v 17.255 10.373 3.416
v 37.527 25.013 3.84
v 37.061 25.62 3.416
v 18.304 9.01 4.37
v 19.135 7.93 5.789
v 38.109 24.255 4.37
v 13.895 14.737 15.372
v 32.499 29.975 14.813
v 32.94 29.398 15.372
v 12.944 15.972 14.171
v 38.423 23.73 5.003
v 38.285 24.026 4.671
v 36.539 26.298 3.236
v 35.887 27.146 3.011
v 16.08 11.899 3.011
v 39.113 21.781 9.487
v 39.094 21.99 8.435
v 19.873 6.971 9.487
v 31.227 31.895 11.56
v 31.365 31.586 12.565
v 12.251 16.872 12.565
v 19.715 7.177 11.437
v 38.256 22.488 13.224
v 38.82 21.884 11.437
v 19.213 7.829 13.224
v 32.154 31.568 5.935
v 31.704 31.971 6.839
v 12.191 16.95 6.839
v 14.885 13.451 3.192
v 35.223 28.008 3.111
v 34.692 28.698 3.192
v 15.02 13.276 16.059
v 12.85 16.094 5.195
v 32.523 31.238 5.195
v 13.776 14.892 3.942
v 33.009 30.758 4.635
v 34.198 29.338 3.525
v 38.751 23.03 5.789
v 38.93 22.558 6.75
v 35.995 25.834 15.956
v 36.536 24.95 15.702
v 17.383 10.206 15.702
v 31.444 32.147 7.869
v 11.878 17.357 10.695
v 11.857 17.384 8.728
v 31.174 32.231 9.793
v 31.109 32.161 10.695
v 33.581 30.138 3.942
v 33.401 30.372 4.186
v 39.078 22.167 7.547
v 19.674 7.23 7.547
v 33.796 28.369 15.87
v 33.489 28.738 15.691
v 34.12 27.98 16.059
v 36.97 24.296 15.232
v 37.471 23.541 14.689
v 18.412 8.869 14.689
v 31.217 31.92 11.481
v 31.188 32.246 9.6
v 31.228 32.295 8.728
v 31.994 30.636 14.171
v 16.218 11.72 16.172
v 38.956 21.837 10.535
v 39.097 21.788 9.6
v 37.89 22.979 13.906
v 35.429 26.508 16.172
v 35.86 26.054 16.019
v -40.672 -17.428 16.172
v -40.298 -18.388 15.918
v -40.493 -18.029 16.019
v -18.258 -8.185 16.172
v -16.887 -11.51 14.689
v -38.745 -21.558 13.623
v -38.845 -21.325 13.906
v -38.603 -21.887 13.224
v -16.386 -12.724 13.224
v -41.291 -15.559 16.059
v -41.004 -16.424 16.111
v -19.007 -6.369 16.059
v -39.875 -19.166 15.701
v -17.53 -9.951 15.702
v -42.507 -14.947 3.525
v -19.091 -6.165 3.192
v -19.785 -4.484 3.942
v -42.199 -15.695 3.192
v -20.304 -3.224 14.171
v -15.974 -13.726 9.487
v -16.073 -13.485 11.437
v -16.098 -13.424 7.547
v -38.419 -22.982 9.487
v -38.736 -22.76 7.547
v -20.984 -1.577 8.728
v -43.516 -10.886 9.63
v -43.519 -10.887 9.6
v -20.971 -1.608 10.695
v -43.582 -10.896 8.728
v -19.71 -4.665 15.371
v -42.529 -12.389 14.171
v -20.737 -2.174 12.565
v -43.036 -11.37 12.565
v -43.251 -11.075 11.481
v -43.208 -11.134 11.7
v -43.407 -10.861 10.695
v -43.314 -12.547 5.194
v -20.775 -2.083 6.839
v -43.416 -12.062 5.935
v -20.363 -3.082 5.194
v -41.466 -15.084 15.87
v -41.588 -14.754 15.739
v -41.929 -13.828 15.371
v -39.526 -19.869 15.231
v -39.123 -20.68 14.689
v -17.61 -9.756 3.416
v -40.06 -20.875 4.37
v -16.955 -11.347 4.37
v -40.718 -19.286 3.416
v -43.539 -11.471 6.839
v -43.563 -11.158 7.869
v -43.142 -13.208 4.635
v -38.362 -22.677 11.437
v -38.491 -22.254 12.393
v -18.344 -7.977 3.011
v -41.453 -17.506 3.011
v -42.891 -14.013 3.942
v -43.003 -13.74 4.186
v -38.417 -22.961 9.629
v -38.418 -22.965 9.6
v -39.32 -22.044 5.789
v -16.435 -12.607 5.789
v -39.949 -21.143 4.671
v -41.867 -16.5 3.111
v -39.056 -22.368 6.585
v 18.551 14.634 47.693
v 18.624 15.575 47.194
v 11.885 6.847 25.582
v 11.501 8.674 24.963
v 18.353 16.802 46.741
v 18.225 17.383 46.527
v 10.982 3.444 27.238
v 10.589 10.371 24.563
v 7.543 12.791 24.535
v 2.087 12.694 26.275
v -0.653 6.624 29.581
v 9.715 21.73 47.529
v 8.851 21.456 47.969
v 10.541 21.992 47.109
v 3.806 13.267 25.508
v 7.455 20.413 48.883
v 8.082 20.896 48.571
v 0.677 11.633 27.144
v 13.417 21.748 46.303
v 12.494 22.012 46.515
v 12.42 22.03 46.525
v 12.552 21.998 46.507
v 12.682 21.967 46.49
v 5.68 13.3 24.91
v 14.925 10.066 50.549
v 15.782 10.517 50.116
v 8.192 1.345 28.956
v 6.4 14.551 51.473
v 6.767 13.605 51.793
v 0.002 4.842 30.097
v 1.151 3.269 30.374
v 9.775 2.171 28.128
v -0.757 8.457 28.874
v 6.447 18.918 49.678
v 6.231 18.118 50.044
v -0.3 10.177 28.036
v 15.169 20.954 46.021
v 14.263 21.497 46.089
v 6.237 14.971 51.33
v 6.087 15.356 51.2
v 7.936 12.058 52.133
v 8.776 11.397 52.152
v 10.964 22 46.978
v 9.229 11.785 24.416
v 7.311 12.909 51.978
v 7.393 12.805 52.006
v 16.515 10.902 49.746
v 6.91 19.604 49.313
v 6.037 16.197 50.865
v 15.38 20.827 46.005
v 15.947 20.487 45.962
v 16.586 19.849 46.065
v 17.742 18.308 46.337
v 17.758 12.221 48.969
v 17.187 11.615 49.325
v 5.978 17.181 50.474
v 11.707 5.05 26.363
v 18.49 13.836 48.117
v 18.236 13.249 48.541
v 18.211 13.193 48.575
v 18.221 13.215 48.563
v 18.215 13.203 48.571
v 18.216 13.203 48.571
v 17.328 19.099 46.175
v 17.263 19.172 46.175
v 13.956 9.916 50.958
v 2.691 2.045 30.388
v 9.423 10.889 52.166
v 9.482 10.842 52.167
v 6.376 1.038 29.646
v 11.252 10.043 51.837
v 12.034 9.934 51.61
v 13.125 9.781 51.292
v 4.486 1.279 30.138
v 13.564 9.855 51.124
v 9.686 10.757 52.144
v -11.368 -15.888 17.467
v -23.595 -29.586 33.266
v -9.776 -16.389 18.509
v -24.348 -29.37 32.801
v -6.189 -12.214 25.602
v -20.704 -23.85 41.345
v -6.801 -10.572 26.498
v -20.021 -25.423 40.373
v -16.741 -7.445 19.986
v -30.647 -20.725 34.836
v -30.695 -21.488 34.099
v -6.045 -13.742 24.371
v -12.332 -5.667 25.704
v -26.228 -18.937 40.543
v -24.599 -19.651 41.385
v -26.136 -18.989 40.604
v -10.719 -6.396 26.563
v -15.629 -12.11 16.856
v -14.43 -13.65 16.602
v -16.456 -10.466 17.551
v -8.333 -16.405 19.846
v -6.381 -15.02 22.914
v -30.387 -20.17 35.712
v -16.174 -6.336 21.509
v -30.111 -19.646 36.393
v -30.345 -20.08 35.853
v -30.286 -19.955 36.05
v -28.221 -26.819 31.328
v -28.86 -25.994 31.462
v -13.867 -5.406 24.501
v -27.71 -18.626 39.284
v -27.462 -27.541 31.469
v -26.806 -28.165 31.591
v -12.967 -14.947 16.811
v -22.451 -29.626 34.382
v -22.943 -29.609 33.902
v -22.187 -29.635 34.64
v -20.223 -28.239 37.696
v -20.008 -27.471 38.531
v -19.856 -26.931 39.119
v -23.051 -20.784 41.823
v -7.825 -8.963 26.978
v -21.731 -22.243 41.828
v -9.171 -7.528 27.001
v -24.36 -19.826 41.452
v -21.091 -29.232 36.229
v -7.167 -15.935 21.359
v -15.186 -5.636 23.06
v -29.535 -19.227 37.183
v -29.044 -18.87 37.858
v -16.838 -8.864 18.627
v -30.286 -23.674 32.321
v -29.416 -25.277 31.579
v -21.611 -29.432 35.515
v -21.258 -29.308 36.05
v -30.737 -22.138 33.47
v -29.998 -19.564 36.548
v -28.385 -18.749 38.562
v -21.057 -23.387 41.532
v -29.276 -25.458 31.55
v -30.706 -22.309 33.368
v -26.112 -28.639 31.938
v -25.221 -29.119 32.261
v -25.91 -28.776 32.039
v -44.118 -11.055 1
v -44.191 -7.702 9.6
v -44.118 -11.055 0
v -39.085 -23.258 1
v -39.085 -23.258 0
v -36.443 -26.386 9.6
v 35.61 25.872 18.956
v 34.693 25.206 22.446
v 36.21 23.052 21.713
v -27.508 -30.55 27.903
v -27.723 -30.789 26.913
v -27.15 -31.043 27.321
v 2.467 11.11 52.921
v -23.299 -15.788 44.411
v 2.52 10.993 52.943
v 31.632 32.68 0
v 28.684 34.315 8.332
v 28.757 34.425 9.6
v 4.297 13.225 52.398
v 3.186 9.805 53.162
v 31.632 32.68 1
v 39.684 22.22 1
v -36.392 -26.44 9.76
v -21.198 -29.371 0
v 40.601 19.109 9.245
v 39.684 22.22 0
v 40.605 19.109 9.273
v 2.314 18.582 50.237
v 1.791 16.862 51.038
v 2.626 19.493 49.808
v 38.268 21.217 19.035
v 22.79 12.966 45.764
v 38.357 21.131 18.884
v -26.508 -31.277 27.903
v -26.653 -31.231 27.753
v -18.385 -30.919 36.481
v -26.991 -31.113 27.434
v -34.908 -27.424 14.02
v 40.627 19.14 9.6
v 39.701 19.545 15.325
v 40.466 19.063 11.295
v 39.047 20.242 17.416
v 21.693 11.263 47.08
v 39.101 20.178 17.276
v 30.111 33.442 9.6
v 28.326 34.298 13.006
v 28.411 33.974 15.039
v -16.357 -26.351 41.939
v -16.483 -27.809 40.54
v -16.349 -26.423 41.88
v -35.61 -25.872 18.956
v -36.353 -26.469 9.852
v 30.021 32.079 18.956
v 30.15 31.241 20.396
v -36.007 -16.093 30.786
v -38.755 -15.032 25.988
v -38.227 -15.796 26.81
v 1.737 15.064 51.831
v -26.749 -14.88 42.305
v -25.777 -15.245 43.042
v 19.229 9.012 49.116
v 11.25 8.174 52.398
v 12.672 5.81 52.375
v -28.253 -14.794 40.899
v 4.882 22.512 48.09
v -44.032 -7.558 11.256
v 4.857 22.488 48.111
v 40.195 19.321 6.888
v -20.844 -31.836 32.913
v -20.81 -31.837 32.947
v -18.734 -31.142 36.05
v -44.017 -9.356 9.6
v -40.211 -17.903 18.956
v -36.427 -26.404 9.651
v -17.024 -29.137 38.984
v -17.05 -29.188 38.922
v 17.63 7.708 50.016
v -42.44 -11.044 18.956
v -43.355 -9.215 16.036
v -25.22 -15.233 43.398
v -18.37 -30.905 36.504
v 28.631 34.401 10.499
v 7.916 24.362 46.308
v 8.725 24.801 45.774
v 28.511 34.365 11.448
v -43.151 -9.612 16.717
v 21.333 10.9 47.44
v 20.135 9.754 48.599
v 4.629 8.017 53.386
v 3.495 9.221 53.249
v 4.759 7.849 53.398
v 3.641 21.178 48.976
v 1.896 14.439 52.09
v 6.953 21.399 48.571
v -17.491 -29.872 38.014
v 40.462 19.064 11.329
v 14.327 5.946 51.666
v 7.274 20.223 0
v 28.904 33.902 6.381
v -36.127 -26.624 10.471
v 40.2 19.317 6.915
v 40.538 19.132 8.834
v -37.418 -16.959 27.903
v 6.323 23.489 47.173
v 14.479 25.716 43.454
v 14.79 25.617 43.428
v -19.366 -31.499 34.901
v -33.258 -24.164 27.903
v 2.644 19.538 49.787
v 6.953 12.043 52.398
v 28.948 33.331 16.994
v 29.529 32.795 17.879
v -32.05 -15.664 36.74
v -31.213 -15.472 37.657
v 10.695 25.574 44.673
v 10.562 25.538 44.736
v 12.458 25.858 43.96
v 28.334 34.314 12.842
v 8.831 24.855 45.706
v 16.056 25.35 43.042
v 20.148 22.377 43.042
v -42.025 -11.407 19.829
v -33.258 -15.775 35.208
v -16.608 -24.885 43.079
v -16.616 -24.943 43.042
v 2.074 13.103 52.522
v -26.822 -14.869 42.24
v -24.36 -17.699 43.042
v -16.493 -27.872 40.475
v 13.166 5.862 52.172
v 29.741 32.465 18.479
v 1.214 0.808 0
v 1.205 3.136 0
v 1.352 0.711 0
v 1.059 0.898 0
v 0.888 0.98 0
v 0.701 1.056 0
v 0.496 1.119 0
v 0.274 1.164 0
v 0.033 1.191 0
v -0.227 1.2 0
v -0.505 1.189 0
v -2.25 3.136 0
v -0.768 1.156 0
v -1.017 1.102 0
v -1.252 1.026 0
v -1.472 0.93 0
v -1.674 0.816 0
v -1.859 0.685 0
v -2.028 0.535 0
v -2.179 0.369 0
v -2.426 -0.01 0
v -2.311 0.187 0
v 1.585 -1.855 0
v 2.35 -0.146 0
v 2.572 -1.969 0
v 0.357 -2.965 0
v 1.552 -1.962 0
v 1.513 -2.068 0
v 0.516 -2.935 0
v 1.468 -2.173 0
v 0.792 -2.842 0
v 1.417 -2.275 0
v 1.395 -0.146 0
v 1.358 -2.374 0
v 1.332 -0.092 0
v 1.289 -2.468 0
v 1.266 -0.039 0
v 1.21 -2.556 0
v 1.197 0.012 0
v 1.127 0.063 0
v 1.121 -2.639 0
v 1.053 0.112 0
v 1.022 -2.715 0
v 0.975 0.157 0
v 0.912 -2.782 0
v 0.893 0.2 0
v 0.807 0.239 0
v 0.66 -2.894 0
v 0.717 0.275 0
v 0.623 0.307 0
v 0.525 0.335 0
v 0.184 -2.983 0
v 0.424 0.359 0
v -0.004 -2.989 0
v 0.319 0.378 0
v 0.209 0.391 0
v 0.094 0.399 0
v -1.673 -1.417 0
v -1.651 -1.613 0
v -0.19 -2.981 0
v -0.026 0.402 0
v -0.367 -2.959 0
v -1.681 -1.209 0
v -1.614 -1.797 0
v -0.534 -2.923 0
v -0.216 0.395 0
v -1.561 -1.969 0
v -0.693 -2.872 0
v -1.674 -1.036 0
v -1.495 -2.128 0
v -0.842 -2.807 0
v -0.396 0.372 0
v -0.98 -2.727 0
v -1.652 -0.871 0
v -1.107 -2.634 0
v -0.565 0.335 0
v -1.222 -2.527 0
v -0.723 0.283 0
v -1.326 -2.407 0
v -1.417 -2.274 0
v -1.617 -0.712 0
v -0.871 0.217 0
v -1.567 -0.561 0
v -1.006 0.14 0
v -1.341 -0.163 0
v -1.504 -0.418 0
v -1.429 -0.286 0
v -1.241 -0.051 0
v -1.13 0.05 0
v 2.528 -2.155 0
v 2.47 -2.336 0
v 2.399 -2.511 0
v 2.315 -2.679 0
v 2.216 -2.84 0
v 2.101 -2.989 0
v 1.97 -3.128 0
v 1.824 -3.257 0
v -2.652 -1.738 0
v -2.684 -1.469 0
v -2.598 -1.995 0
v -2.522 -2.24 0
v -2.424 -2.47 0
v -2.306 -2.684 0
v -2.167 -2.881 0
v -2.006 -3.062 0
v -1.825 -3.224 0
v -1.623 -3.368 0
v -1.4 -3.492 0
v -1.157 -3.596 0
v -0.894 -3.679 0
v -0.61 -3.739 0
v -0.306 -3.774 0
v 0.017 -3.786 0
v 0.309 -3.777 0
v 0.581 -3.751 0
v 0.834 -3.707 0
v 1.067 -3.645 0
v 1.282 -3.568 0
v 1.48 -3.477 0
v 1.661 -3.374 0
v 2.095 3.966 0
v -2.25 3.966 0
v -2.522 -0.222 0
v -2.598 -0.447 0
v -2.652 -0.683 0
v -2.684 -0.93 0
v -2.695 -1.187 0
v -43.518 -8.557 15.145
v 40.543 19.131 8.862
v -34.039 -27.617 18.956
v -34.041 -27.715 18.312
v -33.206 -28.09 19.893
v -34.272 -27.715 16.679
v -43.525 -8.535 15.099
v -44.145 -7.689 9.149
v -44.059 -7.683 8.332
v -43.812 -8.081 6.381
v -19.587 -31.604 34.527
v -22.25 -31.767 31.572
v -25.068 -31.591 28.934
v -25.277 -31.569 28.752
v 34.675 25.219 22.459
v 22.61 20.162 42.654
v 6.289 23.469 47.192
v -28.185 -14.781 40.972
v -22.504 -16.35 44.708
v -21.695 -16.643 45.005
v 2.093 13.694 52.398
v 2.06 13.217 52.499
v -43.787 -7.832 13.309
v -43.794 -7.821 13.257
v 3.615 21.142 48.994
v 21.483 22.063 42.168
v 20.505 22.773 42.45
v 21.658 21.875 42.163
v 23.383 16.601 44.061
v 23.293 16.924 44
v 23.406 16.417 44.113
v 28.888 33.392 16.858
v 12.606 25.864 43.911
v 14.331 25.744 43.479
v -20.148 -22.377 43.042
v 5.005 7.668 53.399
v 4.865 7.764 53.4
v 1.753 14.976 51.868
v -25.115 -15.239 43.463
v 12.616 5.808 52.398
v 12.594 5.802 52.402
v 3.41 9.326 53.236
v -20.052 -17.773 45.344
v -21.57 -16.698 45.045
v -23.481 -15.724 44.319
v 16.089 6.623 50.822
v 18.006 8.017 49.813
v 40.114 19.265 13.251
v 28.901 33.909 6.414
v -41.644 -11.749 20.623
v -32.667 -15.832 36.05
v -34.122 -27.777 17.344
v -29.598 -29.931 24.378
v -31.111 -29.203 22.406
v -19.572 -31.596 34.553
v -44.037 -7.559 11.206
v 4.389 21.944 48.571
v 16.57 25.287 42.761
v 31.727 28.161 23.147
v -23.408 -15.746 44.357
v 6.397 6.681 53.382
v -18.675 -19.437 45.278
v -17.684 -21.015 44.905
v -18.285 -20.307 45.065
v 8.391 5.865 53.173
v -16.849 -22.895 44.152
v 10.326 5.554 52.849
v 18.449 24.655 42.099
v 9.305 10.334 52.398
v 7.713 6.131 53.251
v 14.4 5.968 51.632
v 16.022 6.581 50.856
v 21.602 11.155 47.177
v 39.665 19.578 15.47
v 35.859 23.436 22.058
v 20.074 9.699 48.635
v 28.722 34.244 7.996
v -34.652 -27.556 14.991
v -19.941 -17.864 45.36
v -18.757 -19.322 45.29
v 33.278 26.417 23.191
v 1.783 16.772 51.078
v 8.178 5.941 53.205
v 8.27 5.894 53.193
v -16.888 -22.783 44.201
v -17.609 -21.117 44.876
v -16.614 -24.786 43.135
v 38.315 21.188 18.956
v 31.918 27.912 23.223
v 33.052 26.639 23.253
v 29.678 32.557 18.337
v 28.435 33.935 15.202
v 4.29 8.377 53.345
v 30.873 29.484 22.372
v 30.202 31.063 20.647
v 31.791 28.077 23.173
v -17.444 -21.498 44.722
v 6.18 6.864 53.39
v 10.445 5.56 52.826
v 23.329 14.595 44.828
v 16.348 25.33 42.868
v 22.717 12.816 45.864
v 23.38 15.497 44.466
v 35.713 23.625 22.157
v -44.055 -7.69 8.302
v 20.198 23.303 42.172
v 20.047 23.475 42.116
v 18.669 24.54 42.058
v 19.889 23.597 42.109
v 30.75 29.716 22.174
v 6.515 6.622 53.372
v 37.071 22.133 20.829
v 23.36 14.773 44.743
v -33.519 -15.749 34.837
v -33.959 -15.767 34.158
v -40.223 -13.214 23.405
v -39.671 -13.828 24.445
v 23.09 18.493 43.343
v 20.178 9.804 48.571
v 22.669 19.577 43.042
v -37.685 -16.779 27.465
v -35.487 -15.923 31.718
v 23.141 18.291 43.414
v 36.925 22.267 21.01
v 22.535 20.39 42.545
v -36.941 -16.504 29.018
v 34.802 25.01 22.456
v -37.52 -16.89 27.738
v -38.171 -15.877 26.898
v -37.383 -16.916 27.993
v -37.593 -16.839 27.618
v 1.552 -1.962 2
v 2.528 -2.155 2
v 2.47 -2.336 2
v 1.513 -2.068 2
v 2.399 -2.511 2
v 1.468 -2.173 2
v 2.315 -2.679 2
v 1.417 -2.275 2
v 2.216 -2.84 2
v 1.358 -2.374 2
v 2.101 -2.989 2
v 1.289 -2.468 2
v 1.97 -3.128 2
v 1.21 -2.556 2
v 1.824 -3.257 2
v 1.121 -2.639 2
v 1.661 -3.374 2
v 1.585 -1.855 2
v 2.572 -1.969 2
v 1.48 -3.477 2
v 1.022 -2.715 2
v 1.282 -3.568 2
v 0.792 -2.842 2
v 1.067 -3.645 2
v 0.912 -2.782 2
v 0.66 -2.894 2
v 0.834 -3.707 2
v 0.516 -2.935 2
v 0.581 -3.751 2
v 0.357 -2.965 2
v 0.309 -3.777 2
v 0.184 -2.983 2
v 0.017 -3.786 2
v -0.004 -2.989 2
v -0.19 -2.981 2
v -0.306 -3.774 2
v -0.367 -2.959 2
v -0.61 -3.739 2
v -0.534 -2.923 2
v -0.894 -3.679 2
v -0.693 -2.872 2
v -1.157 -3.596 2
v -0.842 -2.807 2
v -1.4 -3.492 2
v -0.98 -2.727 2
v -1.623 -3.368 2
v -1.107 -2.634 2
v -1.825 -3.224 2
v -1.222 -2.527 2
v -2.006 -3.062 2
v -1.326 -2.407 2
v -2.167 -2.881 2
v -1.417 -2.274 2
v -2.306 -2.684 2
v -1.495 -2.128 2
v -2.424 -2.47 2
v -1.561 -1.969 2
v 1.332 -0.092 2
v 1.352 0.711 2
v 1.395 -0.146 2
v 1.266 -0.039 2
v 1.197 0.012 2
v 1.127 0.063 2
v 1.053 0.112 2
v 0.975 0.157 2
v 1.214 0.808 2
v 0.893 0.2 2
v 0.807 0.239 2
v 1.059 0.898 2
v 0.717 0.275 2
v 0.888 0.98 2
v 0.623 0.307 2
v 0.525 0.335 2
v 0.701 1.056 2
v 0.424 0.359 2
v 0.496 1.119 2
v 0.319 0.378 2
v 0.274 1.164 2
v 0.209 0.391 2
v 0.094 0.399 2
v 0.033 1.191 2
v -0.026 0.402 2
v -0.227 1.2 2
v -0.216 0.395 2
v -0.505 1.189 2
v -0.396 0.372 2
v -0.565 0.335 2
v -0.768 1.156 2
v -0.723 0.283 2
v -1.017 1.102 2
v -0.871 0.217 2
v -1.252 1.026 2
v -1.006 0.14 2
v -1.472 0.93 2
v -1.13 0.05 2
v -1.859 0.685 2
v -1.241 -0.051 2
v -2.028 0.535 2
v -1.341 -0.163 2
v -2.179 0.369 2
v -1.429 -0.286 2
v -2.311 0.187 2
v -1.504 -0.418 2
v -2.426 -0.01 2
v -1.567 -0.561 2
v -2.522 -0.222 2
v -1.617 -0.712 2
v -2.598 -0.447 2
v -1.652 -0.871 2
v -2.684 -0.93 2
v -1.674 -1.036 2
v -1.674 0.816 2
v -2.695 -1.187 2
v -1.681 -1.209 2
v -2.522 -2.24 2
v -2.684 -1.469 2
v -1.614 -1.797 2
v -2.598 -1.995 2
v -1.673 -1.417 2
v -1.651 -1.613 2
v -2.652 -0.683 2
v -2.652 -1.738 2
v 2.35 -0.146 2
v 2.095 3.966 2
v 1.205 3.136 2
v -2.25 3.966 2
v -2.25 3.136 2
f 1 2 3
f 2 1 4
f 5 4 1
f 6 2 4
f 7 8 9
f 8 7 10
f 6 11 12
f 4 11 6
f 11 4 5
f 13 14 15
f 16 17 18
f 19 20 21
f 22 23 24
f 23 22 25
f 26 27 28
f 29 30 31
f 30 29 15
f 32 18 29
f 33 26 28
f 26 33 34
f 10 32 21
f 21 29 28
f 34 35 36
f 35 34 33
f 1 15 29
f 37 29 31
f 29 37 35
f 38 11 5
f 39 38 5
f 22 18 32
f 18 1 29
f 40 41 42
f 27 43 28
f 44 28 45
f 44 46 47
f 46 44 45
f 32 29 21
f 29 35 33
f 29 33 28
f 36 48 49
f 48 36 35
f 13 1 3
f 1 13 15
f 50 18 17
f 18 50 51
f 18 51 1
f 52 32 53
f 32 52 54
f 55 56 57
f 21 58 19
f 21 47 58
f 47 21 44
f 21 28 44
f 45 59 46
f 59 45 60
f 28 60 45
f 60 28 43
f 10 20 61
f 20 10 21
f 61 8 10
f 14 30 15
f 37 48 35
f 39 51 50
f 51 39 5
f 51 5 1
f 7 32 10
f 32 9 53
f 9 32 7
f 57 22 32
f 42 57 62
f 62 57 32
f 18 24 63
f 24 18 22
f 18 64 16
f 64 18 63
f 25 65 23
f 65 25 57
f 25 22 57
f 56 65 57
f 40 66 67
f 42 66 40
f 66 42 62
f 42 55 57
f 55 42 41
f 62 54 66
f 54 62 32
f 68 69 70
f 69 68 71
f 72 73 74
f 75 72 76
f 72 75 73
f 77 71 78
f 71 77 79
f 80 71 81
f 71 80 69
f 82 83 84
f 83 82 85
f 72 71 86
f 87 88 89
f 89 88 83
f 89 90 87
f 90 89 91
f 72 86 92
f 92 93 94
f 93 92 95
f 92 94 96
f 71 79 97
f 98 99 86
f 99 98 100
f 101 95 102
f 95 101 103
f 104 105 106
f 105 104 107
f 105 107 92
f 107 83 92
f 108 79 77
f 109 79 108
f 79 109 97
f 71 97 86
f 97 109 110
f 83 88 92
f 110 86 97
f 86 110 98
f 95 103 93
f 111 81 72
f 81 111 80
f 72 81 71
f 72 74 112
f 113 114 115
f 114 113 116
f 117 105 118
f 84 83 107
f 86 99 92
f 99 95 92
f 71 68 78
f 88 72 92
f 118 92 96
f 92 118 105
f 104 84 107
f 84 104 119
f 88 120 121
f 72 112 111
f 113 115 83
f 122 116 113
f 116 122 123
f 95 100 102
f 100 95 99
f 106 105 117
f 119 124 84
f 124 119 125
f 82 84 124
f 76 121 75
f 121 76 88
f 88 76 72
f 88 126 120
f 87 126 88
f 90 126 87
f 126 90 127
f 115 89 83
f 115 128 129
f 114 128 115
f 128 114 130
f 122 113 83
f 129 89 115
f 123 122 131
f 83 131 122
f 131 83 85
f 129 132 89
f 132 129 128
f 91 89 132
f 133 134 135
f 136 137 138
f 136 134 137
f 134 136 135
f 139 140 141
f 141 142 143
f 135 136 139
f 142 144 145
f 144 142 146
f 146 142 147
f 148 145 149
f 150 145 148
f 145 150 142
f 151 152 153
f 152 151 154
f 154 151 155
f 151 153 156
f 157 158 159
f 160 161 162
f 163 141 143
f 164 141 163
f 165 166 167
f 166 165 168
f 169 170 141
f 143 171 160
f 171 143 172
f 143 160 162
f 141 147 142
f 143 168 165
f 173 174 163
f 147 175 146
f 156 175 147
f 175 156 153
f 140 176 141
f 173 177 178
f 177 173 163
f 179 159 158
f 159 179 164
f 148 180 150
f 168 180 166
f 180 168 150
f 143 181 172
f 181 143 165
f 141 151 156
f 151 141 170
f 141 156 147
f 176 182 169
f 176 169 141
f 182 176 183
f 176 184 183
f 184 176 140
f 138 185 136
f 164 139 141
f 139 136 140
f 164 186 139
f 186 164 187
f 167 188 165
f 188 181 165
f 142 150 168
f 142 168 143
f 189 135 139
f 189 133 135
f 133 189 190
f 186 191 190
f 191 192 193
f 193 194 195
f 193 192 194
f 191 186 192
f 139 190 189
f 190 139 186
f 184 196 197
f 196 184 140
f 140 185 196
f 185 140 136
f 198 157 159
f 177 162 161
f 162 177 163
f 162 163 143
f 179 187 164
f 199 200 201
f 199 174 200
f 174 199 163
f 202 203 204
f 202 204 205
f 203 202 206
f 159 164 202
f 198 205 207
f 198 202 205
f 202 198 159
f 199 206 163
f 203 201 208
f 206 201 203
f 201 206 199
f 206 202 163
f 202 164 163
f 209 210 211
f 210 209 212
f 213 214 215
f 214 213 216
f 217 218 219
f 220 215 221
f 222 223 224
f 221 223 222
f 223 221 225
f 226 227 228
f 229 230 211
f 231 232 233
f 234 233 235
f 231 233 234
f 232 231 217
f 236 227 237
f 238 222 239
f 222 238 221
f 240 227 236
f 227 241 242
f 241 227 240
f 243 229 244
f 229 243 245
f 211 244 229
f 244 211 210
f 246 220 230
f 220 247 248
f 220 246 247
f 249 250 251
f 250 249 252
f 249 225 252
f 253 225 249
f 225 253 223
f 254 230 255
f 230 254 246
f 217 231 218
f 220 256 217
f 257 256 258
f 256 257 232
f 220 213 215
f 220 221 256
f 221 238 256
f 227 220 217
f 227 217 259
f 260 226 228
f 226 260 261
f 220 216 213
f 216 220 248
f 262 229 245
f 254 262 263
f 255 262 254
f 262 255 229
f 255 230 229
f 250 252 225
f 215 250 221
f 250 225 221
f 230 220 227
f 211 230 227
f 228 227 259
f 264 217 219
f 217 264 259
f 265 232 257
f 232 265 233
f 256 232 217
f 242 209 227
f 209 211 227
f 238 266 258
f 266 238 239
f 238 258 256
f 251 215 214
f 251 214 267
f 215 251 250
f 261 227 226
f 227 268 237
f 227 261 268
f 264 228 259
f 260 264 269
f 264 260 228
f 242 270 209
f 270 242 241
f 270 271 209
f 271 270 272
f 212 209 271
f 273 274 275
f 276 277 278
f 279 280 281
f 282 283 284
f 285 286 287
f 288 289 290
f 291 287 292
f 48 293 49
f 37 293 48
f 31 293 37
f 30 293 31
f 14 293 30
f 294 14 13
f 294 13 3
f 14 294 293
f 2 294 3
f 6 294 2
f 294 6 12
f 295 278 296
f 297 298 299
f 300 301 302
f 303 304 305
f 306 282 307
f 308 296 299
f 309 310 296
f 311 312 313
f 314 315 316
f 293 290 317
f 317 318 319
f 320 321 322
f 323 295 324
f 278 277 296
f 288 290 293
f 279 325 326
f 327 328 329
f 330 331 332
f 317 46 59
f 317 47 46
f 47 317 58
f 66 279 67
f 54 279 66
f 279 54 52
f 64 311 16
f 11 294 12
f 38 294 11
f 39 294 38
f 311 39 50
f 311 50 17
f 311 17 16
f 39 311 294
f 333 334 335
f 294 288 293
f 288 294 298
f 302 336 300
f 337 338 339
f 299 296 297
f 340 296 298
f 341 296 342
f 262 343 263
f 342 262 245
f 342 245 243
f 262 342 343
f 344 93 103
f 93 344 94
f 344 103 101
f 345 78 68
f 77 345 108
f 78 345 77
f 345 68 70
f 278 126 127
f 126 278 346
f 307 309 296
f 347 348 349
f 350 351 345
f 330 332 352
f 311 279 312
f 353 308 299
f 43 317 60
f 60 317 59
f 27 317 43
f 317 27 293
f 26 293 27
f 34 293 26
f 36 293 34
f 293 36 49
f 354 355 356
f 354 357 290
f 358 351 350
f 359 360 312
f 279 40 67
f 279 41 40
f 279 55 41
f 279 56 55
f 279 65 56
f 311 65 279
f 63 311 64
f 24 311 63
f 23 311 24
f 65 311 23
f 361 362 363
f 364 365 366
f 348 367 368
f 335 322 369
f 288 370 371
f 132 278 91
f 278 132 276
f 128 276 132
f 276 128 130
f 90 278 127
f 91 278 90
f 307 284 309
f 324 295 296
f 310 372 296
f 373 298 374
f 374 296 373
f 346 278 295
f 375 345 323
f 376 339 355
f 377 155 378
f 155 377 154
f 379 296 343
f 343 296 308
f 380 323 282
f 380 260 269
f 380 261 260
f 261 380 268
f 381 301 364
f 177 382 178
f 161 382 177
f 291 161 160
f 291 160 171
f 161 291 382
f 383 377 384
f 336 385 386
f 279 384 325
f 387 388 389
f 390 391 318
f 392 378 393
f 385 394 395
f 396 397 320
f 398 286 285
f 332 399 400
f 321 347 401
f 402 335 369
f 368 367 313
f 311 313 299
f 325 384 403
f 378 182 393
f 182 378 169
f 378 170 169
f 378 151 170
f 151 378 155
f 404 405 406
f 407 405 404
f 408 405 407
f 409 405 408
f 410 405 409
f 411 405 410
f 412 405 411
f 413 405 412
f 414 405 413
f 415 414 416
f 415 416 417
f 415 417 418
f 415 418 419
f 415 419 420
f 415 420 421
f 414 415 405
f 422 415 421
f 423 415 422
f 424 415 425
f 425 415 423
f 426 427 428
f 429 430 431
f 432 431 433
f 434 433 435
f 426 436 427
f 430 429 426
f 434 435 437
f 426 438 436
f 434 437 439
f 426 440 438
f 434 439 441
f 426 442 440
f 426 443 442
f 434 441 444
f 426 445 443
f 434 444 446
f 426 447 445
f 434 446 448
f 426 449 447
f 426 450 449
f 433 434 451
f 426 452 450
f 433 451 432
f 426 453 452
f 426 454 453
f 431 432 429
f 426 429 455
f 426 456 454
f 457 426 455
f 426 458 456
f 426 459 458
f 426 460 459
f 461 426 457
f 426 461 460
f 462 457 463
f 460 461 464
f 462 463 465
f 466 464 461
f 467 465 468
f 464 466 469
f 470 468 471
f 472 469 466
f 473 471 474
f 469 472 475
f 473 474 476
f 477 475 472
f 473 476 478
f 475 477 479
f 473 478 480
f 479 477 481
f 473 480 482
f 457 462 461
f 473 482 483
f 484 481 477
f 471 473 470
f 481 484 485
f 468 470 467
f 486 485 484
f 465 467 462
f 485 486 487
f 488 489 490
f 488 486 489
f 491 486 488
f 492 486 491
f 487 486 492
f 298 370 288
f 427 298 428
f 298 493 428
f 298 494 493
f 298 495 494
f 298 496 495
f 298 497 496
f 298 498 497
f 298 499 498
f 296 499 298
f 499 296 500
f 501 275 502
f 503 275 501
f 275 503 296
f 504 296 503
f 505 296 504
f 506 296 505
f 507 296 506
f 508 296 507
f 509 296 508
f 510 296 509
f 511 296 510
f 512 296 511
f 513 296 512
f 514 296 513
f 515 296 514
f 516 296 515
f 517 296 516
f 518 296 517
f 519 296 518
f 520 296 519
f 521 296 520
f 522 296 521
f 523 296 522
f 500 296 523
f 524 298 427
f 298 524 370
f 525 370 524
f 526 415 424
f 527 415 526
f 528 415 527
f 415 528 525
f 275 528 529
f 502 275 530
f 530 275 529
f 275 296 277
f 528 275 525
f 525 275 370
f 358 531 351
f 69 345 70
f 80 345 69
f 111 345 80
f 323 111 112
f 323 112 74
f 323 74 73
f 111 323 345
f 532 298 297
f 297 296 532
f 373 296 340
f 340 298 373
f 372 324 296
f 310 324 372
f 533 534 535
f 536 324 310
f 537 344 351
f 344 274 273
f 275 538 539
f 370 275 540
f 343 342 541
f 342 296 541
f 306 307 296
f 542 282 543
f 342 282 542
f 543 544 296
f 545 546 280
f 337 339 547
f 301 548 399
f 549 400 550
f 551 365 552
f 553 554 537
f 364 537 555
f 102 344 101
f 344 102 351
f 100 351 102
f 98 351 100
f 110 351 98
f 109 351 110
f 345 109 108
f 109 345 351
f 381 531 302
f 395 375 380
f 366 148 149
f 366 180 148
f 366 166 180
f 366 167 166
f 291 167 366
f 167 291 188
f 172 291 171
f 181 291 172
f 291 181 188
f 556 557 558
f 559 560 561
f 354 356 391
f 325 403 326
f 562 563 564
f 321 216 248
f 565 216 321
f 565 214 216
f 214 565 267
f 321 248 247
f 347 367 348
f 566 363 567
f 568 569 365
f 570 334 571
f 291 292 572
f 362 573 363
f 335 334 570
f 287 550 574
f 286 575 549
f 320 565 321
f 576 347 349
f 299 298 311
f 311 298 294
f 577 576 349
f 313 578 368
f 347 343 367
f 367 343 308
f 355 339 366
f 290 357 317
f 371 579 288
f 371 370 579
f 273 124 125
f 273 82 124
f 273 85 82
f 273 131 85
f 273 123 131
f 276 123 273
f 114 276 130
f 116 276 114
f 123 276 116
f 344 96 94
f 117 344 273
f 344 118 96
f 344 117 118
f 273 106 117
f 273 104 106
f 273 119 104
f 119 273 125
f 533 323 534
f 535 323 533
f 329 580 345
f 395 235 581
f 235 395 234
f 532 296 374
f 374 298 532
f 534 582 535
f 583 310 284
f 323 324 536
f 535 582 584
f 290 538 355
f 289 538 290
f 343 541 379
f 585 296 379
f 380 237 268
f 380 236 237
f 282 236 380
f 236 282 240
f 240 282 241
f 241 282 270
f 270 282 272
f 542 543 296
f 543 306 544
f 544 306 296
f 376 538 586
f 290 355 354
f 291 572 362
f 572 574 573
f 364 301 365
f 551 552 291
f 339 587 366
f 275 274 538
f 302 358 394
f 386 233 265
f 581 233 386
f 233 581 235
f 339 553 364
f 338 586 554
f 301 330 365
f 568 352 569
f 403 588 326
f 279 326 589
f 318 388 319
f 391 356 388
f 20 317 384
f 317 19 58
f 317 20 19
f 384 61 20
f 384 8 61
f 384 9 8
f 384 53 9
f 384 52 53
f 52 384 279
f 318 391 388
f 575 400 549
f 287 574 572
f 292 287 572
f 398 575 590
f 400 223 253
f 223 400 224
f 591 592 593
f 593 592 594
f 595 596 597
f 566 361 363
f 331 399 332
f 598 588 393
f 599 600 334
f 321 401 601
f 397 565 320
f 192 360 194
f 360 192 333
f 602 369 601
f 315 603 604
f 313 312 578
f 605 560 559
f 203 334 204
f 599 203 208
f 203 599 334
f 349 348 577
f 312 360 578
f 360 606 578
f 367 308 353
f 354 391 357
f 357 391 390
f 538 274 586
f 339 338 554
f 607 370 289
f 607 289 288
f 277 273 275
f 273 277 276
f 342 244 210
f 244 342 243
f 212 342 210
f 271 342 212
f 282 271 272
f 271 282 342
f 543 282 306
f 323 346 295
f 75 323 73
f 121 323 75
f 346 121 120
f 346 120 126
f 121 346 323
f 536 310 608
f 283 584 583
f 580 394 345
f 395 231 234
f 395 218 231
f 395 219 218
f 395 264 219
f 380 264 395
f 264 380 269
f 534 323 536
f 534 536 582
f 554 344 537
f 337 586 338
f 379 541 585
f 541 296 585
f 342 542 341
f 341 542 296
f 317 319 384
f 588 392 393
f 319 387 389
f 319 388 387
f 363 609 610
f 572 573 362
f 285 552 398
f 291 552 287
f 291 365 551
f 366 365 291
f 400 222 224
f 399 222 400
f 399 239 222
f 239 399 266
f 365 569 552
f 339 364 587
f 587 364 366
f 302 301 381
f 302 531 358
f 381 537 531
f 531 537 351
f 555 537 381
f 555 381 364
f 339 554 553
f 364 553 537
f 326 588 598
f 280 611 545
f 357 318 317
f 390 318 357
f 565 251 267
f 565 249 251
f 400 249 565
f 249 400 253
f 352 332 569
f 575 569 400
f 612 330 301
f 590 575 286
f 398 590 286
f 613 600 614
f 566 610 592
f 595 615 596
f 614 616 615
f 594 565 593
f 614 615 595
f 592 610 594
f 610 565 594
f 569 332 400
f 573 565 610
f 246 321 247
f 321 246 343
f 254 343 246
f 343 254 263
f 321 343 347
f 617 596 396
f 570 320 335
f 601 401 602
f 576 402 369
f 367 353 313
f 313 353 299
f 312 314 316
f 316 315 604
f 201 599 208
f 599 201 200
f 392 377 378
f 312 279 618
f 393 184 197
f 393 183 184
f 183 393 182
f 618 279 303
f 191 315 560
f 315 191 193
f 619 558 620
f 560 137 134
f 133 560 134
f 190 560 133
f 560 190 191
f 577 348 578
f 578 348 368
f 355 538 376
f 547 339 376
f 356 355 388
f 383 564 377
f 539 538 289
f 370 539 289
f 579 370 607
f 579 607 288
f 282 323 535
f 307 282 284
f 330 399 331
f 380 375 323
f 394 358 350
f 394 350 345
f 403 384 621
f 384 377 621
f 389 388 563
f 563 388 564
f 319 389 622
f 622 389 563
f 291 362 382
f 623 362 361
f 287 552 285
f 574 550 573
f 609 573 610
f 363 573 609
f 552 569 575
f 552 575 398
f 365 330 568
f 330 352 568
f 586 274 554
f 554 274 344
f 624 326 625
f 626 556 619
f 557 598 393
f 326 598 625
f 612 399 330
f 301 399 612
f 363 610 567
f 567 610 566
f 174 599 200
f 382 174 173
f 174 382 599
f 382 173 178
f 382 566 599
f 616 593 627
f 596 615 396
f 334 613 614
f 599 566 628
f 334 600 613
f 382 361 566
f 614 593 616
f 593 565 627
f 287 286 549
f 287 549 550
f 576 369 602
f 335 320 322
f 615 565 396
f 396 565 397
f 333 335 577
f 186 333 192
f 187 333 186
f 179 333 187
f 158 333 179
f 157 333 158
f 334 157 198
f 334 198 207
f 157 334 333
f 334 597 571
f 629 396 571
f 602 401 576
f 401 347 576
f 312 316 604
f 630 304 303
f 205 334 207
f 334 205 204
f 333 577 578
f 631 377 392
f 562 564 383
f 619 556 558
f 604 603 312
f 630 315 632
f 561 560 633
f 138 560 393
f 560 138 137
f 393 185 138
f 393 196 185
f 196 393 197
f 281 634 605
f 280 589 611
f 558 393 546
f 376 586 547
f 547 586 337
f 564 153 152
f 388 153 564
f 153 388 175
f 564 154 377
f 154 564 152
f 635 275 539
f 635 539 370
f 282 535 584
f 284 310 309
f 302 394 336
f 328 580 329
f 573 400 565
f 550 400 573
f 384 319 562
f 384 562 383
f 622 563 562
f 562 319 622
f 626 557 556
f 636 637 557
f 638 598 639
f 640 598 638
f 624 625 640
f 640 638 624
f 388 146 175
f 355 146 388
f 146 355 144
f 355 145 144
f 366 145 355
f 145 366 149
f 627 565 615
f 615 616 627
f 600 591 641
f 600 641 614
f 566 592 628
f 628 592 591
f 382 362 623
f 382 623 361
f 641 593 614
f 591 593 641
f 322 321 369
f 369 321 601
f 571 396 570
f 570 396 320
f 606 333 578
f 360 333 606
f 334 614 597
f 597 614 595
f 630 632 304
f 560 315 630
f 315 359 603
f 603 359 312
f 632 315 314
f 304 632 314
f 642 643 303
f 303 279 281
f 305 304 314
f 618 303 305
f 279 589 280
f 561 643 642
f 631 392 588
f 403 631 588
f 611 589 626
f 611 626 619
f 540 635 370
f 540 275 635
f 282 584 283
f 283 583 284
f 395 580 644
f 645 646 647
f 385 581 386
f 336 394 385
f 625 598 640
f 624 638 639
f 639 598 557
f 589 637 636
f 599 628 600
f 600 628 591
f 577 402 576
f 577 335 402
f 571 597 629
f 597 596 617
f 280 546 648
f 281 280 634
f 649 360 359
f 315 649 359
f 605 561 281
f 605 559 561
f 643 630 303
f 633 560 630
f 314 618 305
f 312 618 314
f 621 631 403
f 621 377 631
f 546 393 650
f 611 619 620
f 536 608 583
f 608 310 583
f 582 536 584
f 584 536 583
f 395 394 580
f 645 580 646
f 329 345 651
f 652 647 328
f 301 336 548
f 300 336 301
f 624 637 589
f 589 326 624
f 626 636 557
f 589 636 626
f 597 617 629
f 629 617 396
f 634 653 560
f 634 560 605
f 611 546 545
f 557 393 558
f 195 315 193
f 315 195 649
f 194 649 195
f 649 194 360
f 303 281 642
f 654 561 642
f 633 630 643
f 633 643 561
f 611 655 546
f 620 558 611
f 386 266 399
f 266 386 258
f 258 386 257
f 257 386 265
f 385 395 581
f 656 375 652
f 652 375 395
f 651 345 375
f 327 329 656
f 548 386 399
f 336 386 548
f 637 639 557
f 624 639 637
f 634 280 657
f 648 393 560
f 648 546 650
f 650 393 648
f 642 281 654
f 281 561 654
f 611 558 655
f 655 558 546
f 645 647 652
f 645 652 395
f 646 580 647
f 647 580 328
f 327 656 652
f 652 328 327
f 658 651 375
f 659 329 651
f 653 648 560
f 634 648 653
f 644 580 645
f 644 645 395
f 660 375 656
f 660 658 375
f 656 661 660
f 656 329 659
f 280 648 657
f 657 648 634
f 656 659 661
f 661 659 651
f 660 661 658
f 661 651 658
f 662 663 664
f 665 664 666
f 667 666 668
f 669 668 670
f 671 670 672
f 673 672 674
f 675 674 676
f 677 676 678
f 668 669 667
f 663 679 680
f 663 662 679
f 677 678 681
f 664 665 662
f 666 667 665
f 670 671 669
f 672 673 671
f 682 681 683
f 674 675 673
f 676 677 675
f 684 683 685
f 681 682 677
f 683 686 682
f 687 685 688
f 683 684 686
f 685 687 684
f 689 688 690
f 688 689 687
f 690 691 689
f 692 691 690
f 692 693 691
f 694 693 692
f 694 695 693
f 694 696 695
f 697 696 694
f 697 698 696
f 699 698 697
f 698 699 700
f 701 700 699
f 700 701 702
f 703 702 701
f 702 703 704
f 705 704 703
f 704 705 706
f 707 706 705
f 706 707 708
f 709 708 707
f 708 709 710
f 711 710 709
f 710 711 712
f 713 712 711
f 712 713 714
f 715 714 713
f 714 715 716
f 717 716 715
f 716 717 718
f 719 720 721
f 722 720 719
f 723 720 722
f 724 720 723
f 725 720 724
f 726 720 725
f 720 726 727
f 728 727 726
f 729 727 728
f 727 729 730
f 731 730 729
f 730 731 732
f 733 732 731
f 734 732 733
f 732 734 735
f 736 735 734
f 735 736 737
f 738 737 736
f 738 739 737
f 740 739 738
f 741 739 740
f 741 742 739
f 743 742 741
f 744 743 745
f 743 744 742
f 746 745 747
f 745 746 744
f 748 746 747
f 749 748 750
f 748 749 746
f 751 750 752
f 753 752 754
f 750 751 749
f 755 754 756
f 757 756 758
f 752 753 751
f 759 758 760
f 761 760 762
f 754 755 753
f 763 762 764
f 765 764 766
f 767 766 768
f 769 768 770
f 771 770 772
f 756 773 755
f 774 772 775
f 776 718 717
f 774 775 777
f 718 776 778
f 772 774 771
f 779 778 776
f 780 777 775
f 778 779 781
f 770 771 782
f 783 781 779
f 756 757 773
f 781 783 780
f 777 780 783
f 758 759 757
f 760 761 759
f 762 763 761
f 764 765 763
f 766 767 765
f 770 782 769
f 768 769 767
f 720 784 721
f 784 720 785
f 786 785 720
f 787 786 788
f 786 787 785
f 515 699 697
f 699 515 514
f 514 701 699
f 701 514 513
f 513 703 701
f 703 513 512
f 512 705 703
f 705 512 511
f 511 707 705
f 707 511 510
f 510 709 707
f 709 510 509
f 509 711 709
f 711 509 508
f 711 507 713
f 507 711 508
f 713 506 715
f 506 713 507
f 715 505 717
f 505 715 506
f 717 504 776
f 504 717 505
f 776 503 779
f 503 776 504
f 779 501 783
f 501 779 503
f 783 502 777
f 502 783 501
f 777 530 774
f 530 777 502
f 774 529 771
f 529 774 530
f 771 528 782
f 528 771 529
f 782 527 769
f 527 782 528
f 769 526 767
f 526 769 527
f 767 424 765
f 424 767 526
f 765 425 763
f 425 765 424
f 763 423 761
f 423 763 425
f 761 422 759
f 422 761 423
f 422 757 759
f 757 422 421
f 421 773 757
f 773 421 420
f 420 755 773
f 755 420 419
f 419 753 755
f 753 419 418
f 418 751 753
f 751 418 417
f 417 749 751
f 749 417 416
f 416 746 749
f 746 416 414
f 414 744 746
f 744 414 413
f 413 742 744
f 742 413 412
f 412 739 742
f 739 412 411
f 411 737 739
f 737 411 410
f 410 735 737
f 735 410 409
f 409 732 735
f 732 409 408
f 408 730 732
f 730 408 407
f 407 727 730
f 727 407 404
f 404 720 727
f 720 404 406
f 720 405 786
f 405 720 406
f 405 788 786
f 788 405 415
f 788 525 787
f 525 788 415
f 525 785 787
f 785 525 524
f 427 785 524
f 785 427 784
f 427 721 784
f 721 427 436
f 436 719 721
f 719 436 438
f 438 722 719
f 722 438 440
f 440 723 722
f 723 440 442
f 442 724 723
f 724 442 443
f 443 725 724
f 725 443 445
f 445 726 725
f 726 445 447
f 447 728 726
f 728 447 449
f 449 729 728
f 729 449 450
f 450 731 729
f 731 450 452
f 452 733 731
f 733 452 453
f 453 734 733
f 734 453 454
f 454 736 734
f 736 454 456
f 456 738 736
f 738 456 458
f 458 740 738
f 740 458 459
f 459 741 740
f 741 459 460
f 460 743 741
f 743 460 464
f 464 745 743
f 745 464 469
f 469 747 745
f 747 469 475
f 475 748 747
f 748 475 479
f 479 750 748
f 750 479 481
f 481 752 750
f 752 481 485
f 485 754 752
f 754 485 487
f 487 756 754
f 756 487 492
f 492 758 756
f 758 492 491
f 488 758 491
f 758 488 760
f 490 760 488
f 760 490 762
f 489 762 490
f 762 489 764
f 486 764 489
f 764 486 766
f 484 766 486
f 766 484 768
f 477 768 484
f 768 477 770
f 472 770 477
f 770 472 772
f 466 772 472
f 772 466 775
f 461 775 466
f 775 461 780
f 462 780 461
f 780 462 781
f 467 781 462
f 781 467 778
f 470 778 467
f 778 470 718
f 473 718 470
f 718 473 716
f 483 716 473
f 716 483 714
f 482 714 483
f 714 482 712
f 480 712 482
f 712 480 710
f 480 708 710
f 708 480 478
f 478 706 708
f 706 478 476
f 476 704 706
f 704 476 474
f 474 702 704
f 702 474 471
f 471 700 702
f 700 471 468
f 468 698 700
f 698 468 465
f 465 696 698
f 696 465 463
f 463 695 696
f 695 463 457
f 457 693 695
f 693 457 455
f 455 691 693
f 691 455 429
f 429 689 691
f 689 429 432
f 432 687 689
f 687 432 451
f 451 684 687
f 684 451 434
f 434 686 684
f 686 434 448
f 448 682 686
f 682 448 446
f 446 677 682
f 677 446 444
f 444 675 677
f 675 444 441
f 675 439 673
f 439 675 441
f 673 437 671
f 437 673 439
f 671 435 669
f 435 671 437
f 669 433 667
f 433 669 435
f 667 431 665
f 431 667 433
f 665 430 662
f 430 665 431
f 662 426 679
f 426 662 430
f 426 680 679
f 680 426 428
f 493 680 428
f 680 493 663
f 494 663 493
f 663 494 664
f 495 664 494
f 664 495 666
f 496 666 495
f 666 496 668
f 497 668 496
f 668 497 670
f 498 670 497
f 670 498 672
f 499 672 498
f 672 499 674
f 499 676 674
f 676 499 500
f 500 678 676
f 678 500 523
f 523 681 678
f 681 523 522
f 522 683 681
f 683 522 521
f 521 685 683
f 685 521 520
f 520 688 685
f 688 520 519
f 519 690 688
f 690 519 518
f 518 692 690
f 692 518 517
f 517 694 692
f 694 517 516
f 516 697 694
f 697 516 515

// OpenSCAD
difference() {
	difference() {
		difference() {
			hull() {
				union() {
					union() {
						rotate(a = 37.5890894690, v = [0, 0, 1]) {
							translate(v = [0, -6.6000000000, 0]) {
								cube(size = [45.0000000000, 13.2000000000, 1]);
							}
						}
						rotate(a = -157.5890894690, v = [0, 0, 1]) {
							translate(v = [0, -6.6000000000, 0]) {
								cube(size = [45.0000000000, 13.2000000000, 1]);
							}
						}
						rotate(a = 52.3322448948, v = [0, 0, 1]) {
							translate(v = [0, -6.6000000000, 0]) {
								cube(size = [20.4525172261, 13.2000000000, 1]);
							}
						}
						rotate(a = -136.3184789904, v = [0, 0, 1]) {
							translate(v = [0, -6.6000000000, 0]) {
								cube(size = [35.6153347081, 13.2000000000, 1]);
							}
						}
					}
					translate(v = [0, 0, 9.6000058734]) {
						intersection() {
							hull() {
								rotate(a = 89.9999116164, v = [-0.6099942813, 0.7924058157, -0.0000001824]) {
									cylinder(h = 45, r = 9.6000000000);
								}
								rotate(a = 90.0000822905, v = [0.3812464258, -0.9244734516, 0.0000005432]) {
									cylinder(h = 45, r = 9.6000000000);
								}
								rotate(a = 27.0327122216, v = [-0.3597668695, 0.2777359572, 0.0000000820]) {
									cylinder(h = 45, r = 9.6000000000);
								}
								rotate(a = 52.3214809131, v = [0.5466162241, -0.5723706436, 0.0000000258]) {
									cylinder(h = 45, r = 9.6000000000);
								}
							}
							sphere(r = 45);
						}
					}
				}
			}
			translate(v = [0, 0, 9.6000058734]) {
				rotate(a = 89.9999116164, v = [-0.6099942813, 0.7924058157, -0.0000001824]) {
					translate(v = [0, 0, 20]) {
						cylinder(h = 45, r = 6.6000000000);
					}
				}
				rotate(a = 90.0000822905, v = [0.3812464258, -0.9244734516, 0.0000005432]) {
					translate(v = [0, 0, 20]) {
						cylinder(h = 45, r = 6.6000000000);
					}
				}
				rotate(a = 27.0327122216, v = [-0.3597668695, 0.2777359572, 0.0000000820]) {
					translate(v = [0, 0, 20]) {
						cylinder(h = 45, r = 6.6000000000);
					}
				}
				rotate(a = 52.3214809131, v = [0.5466162241, -0.5723706436, 0.0000000258]) {
					translate(v = [0, 0, 20]) {
						cylinder(h = 45, r = 6.6000000000);
					}
				}
			}
		}
		translate(v = [-100, -100, -100]) {
			cube(size = [200, 200, 100]);
		}
	}
	translate(v = [0, 0, 2]) {
		rotate(a = 180, v = [0, 1, 0]) {
			linear_extrude(height = 3) {
				text(halign = "center", size = 8, text = "5", valign = "center");
			}
		}
	}
}
